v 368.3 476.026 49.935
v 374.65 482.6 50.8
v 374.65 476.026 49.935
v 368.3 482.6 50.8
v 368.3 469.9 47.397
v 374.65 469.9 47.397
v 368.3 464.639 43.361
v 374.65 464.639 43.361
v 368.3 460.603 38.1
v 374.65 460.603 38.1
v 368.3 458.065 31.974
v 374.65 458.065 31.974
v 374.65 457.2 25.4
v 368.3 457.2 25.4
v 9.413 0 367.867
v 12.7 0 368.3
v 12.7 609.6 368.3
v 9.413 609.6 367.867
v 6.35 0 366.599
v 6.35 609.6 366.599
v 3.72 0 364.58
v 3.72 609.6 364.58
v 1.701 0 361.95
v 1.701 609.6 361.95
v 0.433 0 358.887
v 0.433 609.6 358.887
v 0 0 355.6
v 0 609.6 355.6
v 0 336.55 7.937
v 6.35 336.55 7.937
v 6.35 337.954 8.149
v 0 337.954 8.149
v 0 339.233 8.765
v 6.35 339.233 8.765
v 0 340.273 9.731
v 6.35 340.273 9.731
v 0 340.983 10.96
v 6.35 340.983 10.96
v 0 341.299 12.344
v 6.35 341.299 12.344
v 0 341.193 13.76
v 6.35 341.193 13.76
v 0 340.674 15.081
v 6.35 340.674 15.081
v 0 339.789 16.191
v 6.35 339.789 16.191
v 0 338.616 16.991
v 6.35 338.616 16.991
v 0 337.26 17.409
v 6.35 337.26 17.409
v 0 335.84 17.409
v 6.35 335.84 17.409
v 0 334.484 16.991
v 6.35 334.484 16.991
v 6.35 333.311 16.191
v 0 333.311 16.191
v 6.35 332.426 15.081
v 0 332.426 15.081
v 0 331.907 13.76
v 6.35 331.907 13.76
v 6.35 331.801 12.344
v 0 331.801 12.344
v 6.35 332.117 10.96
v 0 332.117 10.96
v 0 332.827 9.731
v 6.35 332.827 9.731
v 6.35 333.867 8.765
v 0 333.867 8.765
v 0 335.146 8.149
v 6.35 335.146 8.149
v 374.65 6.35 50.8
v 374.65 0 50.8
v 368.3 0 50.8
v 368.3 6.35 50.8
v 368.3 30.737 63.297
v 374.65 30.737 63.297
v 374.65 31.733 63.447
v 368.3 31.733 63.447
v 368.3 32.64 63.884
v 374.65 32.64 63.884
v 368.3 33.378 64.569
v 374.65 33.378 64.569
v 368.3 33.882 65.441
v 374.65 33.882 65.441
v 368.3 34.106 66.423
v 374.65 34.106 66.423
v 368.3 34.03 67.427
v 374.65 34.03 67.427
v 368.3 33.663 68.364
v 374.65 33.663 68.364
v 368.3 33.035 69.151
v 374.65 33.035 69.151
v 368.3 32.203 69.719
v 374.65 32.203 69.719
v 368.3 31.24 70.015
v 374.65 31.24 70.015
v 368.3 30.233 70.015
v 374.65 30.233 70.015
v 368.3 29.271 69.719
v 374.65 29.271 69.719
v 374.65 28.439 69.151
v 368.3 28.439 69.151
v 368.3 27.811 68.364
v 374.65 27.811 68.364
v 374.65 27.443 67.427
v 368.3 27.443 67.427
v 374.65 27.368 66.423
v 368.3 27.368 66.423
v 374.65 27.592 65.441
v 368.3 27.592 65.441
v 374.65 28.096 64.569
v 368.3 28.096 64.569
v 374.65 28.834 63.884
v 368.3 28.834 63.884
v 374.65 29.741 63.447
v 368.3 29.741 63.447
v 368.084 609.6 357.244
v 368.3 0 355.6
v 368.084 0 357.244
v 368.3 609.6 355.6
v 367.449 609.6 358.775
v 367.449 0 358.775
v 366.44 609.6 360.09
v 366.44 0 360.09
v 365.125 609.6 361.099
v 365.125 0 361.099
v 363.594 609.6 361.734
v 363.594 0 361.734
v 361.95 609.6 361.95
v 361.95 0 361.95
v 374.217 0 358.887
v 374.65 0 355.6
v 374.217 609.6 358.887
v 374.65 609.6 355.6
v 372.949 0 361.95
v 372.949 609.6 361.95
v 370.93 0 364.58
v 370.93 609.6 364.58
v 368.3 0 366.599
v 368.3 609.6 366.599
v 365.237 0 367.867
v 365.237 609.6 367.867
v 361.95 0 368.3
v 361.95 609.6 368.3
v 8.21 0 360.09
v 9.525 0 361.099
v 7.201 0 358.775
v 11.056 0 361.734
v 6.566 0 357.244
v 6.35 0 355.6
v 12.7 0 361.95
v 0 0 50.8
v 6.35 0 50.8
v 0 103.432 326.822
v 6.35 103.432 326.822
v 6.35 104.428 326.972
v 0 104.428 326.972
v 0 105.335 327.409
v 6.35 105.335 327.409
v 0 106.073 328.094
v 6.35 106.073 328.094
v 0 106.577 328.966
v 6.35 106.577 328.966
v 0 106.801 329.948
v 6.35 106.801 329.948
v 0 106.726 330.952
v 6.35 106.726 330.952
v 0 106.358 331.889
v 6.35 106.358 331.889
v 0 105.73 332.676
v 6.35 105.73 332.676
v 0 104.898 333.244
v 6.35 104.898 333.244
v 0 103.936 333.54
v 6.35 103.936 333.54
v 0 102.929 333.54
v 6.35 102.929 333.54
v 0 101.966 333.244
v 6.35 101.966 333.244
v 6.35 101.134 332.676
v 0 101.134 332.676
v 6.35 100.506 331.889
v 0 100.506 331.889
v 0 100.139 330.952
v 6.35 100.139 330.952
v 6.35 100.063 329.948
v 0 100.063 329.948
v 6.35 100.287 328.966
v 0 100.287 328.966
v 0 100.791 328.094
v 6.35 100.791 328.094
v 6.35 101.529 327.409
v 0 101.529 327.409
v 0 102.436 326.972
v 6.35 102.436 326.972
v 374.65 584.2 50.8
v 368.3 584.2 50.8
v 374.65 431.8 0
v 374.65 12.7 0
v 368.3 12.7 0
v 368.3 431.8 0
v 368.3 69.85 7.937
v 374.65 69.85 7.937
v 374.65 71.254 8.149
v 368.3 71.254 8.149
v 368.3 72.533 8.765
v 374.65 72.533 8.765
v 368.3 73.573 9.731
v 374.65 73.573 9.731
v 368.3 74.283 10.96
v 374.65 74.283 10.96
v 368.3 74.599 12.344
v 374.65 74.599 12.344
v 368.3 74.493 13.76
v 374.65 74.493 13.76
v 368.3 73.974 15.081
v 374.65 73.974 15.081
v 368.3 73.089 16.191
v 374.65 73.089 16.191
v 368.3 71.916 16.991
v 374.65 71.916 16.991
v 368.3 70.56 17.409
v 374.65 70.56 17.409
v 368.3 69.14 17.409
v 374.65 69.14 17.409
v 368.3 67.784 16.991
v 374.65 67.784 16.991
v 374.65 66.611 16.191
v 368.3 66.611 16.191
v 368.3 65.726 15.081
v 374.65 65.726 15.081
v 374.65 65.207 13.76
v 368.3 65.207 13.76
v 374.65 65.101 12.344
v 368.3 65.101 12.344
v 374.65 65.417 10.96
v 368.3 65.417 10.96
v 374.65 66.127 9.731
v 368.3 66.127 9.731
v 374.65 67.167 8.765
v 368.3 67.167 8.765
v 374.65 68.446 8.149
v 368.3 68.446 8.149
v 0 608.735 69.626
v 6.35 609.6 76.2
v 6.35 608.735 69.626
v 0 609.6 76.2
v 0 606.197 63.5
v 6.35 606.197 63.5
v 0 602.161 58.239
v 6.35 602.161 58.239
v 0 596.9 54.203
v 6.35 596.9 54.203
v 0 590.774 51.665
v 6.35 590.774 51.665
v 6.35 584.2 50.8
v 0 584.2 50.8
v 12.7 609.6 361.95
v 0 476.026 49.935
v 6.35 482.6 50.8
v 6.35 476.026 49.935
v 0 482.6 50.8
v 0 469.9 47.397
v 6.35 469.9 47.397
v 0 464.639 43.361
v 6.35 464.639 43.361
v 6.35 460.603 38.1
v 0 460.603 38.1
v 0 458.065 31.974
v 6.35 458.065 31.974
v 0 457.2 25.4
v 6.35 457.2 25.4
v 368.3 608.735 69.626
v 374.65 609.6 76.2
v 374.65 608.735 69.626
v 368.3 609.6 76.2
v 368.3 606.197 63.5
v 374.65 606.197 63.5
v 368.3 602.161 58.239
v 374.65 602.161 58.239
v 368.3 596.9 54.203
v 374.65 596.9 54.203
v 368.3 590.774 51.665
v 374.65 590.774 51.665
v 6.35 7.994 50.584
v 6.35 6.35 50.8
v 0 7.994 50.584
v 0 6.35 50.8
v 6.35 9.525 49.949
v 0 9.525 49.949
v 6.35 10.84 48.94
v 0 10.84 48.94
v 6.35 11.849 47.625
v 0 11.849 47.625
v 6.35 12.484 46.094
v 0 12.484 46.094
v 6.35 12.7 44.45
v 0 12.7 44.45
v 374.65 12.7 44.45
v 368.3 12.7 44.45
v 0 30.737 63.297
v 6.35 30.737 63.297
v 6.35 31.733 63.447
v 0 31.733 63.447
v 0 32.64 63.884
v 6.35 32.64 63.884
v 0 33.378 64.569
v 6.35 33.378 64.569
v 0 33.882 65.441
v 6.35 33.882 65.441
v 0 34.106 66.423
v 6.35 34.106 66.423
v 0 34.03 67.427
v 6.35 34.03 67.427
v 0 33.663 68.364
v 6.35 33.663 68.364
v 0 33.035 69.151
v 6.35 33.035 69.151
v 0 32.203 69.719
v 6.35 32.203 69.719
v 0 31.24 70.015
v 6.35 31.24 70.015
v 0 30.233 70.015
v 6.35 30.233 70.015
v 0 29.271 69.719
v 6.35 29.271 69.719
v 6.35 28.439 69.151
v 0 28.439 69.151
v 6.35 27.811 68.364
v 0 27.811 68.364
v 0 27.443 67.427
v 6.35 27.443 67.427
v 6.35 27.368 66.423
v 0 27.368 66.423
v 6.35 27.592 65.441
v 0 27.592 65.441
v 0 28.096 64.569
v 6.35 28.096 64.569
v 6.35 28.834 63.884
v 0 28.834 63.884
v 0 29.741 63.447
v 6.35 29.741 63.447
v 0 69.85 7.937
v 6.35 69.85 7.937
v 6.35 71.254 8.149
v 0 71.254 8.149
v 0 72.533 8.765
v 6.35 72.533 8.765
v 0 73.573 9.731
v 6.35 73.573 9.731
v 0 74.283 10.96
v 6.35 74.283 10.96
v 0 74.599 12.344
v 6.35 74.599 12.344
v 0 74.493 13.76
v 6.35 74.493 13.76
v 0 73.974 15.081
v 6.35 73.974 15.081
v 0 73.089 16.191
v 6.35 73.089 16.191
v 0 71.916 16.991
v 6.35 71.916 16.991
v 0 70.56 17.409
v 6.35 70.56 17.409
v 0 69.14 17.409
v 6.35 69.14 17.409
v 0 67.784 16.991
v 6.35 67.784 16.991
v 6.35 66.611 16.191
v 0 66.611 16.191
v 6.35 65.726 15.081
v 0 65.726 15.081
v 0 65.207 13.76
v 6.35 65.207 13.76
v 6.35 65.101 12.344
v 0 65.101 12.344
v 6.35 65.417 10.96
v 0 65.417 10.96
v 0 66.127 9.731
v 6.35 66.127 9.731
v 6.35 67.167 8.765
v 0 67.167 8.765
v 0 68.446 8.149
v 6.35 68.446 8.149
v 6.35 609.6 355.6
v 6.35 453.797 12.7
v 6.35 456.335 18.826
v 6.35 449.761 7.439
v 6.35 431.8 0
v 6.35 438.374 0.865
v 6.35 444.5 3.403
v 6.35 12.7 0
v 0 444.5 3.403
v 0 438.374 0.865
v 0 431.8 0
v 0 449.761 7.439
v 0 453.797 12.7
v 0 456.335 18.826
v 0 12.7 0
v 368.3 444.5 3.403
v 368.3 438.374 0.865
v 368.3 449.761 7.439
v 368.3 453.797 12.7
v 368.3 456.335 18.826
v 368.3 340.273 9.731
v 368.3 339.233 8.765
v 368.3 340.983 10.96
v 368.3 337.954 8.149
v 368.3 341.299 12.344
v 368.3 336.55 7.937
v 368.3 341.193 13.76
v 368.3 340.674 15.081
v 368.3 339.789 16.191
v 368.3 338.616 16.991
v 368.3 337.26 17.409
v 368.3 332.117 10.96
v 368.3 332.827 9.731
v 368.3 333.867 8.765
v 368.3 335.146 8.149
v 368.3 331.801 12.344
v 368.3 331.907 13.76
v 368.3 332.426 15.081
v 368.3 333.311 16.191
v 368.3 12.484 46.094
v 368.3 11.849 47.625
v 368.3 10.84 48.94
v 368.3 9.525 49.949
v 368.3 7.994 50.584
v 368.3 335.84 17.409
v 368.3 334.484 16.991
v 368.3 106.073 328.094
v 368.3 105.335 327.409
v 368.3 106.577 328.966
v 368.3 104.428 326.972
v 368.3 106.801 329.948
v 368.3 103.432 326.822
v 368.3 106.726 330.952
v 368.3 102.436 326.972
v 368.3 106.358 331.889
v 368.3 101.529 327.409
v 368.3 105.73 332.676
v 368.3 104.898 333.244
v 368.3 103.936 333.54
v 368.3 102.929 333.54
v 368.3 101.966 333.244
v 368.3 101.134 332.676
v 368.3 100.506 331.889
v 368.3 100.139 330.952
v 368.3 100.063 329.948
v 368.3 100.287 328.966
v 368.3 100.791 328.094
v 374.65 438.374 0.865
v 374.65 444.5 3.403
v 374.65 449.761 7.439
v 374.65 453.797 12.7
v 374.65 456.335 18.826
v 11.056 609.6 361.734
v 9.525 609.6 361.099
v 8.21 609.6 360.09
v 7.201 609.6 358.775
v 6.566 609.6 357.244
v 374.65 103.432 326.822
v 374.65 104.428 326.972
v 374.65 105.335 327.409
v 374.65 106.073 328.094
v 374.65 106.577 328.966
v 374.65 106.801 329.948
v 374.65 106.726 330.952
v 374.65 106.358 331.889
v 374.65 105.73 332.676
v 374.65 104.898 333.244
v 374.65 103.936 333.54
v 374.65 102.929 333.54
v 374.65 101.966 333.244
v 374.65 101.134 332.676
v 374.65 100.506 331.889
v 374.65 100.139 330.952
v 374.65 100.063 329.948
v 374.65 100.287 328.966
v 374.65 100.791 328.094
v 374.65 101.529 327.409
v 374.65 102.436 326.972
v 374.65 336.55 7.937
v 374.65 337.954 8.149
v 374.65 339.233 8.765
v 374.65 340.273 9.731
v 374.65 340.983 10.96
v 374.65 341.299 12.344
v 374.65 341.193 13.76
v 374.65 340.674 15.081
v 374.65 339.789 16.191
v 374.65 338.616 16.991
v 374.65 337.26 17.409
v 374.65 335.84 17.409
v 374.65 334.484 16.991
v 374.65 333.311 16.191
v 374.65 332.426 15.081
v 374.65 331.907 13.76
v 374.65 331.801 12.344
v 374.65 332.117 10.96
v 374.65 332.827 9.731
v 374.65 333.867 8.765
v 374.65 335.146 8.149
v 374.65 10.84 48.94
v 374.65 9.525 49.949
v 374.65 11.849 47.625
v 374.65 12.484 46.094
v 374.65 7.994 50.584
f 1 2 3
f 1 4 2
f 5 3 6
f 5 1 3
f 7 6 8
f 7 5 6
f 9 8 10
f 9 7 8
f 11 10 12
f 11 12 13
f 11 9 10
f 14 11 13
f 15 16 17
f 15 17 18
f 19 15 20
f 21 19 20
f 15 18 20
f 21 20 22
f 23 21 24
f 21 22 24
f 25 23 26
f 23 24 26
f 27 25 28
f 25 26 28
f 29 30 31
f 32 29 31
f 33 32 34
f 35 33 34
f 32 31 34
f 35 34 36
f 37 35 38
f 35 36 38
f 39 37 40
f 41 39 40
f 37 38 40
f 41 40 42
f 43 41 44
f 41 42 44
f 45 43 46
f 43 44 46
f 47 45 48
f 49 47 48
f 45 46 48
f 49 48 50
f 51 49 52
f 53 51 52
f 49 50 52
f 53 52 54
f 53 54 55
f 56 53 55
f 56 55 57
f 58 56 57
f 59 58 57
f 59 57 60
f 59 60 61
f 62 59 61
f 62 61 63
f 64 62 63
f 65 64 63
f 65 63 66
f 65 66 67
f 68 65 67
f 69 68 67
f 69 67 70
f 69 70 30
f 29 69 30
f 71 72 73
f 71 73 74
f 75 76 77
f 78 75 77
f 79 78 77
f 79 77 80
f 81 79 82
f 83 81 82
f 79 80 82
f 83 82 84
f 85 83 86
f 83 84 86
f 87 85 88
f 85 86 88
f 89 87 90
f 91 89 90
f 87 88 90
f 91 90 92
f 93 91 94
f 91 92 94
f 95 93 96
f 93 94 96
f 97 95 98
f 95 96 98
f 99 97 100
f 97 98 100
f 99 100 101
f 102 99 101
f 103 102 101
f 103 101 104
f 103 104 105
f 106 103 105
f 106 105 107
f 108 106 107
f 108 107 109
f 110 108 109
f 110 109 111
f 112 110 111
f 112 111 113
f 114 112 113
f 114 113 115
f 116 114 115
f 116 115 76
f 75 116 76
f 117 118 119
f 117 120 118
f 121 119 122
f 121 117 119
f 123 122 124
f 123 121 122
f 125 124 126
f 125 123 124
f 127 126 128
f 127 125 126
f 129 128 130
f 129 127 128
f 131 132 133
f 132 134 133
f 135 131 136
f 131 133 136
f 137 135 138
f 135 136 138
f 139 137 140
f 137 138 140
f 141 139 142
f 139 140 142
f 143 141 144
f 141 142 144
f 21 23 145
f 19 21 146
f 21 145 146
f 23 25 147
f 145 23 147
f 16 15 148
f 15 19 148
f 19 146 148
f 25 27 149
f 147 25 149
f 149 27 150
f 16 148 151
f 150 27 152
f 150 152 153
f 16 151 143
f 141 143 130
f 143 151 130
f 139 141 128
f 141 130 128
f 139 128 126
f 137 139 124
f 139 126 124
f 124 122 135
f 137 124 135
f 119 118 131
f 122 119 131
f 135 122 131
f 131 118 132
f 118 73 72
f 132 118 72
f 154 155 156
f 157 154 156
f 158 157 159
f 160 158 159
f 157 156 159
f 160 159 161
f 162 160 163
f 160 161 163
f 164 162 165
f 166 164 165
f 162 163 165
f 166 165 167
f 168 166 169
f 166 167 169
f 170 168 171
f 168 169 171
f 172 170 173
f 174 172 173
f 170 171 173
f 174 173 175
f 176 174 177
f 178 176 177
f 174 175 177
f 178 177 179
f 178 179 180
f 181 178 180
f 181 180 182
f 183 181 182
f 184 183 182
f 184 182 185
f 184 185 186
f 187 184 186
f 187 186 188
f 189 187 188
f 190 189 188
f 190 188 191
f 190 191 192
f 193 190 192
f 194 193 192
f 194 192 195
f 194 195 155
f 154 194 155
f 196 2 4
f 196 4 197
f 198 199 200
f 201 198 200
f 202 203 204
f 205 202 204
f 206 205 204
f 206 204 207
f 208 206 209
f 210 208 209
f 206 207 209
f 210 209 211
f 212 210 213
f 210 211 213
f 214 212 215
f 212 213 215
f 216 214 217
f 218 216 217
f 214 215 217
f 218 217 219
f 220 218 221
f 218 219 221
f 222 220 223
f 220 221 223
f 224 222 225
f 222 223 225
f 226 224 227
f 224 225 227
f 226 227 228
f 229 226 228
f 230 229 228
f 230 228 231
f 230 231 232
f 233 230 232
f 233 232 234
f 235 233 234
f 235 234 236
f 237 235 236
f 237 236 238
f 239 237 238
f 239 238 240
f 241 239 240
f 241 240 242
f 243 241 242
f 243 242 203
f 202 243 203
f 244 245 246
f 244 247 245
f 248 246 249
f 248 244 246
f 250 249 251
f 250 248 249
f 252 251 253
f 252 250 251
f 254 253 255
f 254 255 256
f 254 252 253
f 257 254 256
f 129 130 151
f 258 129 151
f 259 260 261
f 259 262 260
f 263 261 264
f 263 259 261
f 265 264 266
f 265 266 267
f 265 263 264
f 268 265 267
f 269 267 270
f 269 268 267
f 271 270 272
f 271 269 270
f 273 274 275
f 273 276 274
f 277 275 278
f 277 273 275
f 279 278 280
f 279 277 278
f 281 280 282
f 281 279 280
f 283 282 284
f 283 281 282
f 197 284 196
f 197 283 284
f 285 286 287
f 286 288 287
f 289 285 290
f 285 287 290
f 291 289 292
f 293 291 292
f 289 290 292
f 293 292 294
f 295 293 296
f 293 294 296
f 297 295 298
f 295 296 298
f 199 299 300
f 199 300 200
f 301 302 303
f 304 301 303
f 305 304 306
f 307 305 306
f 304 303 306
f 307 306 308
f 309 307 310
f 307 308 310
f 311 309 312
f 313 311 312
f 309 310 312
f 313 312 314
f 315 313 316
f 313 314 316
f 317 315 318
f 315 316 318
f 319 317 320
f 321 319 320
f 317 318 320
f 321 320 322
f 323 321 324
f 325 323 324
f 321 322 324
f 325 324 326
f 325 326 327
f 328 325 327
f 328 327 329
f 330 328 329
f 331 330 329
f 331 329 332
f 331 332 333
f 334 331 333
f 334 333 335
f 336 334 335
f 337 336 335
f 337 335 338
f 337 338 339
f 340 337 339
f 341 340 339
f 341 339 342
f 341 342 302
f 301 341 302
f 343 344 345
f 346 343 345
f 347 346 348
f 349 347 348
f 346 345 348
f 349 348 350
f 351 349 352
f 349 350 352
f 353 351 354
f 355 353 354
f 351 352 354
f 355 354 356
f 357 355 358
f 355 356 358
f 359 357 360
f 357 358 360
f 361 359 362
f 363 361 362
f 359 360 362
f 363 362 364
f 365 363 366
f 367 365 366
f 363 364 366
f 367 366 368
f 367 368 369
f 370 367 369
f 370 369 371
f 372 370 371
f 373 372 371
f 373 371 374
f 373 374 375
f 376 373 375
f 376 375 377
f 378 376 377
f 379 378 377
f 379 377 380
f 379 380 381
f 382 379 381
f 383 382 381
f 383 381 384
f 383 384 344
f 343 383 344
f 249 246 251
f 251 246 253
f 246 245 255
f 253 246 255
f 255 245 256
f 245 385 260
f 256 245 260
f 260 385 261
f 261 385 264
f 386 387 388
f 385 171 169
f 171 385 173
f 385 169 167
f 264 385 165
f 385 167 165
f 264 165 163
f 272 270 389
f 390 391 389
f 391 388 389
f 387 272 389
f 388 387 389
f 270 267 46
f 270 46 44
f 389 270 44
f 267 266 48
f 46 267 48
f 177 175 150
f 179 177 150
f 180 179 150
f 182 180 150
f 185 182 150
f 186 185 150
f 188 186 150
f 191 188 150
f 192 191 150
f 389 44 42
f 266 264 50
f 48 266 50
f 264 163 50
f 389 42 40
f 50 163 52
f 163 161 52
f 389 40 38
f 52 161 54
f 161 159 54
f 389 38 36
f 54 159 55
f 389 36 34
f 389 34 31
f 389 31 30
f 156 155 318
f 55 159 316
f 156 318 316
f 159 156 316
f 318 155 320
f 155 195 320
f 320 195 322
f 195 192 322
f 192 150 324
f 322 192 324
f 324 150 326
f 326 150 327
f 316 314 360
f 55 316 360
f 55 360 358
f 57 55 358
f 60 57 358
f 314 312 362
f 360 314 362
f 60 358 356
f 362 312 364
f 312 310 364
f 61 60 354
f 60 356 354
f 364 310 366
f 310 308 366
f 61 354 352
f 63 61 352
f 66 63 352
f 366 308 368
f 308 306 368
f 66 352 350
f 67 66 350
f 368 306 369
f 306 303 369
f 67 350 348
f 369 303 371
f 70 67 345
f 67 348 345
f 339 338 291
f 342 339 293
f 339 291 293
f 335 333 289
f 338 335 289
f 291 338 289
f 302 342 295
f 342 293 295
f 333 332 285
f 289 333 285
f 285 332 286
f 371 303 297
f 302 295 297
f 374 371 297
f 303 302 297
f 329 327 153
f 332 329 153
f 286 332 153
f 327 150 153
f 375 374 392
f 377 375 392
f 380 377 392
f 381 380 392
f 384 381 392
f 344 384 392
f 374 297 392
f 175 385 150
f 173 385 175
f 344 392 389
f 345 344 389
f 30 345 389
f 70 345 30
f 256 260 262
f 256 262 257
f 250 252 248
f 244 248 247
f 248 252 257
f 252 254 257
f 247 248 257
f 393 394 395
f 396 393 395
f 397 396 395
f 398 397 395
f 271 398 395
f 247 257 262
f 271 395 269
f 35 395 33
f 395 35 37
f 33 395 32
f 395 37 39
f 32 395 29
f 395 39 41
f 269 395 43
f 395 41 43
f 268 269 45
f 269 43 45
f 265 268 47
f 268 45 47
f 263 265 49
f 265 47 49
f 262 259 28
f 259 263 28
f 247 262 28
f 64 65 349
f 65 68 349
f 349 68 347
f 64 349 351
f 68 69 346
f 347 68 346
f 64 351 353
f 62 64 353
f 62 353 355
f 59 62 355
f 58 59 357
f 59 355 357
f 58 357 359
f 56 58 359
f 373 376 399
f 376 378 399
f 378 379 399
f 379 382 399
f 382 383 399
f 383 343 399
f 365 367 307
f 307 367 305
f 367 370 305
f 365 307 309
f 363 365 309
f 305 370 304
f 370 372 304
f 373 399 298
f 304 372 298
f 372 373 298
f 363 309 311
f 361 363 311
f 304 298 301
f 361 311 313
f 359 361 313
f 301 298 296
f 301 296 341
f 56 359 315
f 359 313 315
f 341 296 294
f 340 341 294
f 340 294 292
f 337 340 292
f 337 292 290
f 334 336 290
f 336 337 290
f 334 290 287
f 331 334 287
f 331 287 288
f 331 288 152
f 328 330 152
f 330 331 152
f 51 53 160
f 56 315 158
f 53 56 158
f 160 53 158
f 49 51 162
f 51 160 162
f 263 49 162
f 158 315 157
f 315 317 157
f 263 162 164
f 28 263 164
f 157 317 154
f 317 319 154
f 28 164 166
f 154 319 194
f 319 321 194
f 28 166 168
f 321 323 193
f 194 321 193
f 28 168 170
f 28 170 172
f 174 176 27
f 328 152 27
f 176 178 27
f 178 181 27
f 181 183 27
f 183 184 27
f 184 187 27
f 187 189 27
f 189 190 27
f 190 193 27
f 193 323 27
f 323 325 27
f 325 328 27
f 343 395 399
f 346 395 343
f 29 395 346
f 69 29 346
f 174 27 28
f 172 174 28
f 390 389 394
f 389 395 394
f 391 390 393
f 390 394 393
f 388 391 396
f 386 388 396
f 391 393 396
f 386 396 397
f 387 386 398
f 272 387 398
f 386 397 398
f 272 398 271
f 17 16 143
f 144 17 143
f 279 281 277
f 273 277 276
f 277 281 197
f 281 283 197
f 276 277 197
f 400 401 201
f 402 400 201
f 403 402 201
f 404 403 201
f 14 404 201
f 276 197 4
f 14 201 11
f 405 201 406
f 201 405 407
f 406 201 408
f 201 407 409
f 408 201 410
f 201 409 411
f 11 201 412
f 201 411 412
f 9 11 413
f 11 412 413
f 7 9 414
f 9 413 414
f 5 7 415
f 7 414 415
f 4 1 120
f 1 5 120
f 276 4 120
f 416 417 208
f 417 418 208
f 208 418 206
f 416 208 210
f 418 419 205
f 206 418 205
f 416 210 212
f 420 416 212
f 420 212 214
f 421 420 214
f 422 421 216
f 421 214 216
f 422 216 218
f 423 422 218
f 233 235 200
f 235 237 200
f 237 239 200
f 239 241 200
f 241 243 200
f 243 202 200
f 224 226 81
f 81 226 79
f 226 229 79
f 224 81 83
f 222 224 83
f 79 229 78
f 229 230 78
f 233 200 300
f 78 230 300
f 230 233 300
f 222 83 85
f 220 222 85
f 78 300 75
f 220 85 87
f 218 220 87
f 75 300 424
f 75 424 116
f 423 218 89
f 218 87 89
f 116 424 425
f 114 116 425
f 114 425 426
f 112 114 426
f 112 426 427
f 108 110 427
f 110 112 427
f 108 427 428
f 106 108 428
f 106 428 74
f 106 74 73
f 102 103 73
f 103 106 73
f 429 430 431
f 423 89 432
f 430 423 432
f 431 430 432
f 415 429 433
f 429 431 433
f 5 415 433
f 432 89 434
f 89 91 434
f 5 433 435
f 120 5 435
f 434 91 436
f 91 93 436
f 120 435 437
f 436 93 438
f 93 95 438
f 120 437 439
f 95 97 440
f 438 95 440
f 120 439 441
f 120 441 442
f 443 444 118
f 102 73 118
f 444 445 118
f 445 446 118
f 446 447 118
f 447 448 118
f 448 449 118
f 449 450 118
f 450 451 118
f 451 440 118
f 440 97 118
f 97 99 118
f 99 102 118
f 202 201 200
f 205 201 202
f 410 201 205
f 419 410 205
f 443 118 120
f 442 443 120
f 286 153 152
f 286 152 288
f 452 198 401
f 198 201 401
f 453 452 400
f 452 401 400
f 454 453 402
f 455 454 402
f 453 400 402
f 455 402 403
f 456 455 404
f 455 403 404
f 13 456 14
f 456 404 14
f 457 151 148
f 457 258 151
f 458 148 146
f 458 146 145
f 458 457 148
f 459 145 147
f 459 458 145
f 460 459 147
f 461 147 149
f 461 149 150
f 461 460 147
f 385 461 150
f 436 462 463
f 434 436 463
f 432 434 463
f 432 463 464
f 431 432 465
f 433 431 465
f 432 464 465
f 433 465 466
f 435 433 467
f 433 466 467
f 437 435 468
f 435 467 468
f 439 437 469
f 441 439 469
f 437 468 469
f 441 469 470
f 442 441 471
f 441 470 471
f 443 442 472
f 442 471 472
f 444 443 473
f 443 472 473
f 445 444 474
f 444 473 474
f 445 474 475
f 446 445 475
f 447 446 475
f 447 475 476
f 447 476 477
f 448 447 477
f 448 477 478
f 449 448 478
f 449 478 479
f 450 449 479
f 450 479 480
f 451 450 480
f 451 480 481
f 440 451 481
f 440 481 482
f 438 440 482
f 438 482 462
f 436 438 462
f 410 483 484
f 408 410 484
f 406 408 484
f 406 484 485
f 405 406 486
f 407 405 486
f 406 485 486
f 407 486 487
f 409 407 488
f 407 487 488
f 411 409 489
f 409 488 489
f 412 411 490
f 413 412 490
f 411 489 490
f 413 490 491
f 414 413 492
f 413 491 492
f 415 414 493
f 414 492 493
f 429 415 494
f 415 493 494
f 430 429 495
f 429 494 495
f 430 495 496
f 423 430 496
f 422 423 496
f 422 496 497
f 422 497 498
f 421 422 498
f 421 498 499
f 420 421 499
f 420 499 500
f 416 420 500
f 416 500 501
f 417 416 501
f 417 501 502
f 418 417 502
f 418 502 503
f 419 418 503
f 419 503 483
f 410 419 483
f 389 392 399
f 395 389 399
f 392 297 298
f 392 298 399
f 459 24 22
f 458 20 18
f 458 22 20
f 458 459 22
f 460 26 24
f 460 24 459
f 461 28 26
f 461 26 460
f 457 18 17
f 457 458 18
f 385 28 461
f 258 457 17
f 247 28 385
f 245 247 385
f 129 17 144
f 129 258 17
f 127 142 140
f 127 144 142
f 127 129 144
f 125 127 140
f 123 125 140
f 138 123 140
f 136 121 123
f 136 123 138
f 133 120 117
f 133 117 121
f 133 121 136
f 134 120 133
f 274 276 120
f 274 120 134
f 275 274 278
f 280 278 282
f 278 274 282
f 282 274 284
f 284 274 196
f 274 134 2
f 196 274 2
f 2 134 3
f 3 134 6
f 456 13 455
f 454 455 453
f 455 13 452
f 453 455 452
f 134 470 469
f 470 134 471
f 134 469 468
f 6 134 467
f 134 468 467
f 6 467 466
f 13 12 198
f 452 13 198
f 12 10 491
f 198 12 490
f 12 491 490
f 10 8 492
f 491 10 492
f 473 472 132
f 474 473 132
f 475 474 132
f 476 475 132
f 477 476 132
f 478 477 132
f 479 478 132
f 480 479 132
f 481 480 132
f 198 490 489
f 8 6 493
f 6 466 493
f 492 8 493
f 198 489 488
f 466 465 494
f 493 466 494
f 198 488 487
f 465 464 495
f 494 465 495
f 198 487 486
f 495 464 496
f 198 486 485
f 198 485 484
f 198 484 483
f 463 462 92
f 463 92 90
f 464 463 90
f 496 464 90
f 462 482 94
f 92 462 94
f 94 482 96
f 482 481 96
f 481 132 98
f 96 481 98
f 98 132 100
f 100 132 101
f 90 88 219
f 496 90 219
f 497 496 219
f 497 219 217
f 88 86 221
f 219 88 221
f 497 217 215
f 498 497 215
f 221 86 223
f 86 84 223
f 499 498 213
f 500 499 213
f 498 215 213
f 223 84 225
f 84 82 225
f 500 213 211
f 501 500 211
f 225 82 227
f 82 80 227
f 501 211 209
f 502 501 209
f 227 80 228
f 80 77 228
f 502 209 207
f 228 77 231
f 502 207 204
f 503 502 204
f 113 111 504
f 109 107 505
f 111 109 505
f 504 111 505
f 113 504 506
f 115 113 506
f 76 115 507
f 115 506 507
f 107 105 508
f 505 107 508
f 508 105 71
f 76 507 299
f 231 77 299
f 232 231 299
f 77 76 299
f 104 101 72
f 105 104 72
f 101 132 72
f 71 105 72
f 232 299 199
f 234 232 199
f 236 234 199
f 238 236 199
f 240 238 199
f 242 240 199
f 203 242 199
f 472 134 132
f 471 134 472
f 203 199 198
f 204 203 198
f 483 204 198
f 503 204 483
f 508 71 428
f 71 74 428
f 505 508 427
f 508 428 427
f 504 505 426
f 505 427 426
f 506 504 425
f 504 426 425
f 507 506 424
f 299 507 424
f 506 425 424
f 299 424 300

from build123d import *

# Parameters (mm, degrees)
BOSS_EXTRUDE1_DEPTH = 609.6
FILLET1_R           = 6.35
FILLET2_R           = 12.7
SKETCH2_W           = 50.8
SKETCH2_H           = 12.7
CUT_EXTRUDE1_DEPTH  = 805.748204409
SKETCH4_W           = 50.8
SKETCH4_H           = 152.4
CUT_EXTRUDE2_DEPTH  = 805.748204409
SKETCH5_R           = 3.3782
CUT_EXTRUDE3_DEPTH  = 805.748204409
SKETCH6_R           = 4.7625
CUT_EXTRUDE4_DEPTH  = 805.748204409
FILLET3_R           = 25.4
FILLET4_R           = 6.35


with BuildPart() as part:
    # Sketch1 → Boss-Extrude1 (new body)
    with BuildSketch(Plane(origin=(0, 0, 0), x_dir=(1, 0, 0), z_dir=(0, 1, 0))):
        Polygon((0, 0), (0, -368.3), (374.65, -368.3), (374.65, 0), (368.3, 0), (368.3, -361.95), (6.35, -361.95), (6.35, 0), align=None)
    extrude(amount=BOSS_EXTRUDE1_DEPTH)

    # Fillet1
    fillet1_edges = [part.edges().sort_by_distance(p)[0] for p in [
        (6.35, 304.8, 361.95),
        (368.3, 304.8, 361.95),
    ]]
    fillet(fillet1_edges, radius=FILLET1_R)

    # Fillet2
    fillet2_edges = [part.edges().sort_by_distance(p)[0] for p in [
        (374.65, 304.8, 368.3),
        (0, 304.8, 368.3),
    ]]
    fillet(fillet2_edges, radius=FILLET2_R)

    # Sketch2 → Cut-Extrude1 (cut, through all)
    with BuildSketch(Plane(origin=(374.65, 0, 0), x_dir=(0, 0, -1), z_dir=(1, 0, 0))):
        with Locations((-25.4, 6.35)):
            Rectangle(SKETCH2_W, SKETCH2_H)
    extrude(amount=-CUT_EXTRUDE1_DEPTH, mode=Mode.SUBTRACT)

    # Sketch4 → Cut-Extrude2 (cut, through all)
    with BuildSketch(Plane(origin=(374.65, 0, 0), x_dir=(0, 0, -1), z_dir=(1, 0, 0))):
        with Locations((-25.4, 533.4)):
            Rectangle(SKETCH4_W, SKETCH4_H)
    extrude(amount=-CUT_EXTRUDE2_DEPTH, mode=Mode.SUBTRACT)

    # Sketch5 → Cut-Extrude3 (cut, through all)
    with BuildSketch(Plane(origin=(374.65, 0, 0), x_dir=(0, 0, -1), z_dir=(1, 0, 0))):
        with Locations((-330.2, 103.432077108)):
            Circle(SKETCH5_R)
        with Locations((-66.675, 30.736970621)):
            Circle(SKETCH5_R)
    extrude(amount=-CUT_EXTRUDE3_DEPTH, mode=Mode.SUBTRACT)

    # Sketch6 → Cut-Extrude4 (cut, through all)
    with BuildSketch(Plane(origin=(374.65, 0, 0), x_dir=(0, 0, -1), z_dir=(1, 0, 0))):
        with Locations((-12.7, 69.85)):
            Circle(SKETCH6_R)
        with Locations((-12.7, 336.55)):
            Circle(SKETCH6_R)
    extrude(amount=-CUT_EXTRUDE4_DEPTH, mode=Mode.SUBTRACT)

    # Fillet3
    fillet3_edges = [part.edges().sort_by_distance(p)[0] for p in [
        (3.175, 457.2, 0),
        (371.475, 457.2, 0),
        (371.475, 457.2, 50.8),
        (3.175, 457.2, 50.8),
        (3.175, 609.6, 50.8),
        (371.475, 609.6, 50.8),
    ]]
    fillet(fillet3_edges, radius=FILLET3_R - 0.0001)  # a hair under: the kernel refuses the full size

    # Fillet4
    fillet4_edges = [part.edges().sort_by_distance(p)[0] for p in [
        (371.475, 12.7, 50.8),
        (3.175, 12.7, 50.8),
    ]]
    fillet(fillet4_edges, radius=FILLET4_R)


solid = part.part
